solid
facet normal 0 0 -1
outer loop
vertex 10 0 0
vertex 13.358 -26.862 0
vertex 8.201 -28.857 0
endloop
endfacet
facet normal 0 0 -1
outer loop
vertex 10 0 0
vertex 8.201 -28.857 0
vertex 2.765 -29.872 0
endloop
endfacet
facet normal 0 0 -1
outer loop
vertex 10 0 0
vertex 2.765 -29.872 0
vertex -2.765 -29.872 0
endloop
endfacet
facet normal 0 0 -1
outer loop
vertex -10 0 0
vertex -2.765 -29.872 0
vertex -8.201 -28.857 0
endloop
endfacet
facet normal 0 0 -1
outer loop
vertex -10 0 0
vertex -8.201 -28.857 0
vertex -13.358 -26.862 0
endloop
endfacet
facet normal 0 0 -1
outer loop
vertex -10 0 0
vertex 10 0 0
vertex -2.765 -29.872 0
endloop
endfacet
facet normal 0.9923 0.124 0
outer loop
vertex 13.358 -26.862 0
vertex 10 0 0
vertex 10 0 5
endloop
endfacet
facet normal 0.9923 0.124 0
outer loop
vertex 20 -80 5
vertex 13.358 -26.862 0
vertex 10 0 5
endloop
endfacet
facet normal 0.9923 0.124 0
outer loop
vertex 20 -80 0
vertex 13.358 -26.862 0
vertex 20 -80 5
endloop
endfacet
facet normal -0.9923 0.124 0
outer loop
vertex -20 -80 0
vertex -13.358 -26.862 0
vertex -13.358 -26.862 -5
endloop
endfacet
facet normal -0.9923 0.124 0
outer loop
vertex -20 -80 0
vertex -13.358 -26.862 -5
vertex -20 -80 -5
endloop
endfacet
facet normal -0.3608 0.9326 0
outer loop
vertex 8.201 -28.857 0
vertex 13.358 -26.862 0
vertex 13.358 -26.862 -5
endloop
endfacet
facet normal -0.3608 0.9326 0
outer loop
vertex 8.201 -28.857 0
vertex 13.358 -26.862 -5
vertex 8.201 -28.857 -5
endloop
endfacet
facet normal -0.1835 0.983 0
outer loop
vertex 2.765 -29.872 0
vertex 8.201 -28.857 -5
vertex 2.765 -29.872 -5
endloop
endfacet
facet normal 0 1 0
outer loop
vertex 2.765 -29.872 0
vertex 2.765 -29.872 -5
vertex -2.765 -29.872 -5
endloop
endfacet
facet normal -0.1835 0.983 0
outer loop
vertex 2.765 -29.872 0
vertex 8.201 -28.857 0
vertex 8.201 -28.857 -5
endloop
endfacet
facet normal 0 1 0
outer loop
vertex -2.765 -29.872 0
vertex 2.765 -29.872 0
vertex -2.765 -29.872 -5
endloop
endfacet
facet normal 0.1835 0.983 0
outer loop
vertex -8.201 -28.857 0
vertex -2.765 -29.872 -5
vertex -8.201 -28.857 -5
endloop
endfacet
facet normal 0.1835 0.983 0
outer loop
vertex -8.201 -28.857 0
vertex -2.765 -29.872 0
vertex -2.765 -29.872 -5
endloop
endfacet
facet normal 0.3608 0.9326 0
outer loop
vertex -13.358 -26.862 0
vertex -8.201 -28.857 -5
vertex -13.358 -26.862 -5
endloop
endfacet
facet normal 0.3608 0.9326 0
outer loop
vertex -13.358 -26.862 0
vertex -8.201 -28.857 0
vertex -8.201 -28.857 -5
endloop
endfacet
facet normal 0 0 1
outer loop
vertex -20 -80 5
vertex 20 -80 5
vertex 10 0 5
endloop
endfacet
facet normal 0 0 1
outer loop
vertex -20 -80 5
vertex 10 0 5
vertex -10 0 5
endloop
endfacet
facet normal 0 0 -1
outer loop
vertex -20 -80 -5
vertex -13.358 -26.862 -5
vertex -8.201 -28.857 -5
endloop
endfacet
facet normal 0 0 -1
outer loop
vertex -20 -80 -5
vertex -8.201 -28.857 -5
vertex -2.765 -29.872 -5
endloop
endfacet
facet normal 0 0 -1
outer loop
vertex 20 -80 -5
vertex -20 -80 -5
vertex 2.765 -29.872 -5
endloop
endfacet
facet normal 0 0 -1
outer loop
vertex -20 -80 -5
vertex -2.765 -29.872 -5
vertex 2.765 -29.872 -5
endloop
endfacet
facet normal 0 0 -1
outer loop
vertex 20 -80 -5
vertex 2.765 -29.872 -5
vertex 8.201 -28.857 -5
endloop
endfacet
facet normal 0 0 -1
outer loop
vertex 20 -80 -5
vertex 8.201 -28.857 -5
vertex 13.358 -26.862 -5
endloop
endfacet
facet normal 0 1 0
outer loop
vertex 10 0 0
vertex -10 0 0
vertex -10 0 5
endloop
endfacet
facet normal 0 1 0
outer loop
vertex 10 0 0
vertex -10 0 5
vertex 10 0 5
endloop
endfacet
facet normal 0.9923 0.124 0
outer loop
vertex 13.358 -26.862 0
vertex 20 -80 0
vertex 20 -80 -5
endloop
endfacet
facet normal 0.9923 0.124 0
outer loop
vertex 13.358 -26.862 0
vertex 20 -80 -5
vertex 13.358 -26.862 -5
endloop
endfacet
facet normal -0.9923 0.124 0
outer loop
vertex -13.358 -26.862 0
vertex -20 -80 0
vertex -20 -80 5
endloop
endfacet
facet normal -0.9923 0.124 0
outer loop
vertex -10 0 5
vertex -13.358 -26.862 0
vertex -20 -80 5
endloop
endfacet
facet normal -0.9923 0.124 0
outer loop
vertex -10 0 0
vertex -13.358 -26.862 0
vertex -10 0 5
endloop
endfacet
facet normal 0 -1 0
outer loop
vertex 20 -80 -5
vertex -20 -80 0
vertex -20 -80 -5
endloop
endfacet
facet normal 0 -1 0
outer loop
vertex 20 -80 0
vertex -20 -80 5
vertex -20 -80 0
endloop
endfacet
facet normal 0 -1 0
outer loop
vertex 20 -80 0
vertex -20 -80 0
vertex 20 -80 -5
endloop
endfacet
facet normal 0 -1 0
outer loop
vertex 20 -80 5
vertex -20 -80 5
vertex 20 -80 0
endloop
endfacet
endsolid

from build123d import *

# Parameters (mm, degrees)
BOSS_EXTRUDE1_DEPTH = 5
BOSS_EXTRUDE2_DEPTH = 5


with BuildPart() as part:
    # Sketch1 → Boss-Extrude1 (new body)
    with BuildSketch(Plane.XY):
        Polygon((-10, 0), (10, 0), (20, -80), (-20, -80), align=None)
    extrude(amount=BOSS_EXTRUDE1_DEPTH)

    # Sketch2 → Boss-Extrude2 (add)
    with BuildSketch(Plane.XY):
        with BuildLine():
            Line((20, -80), (13.357757603, -26.862060826))
            ThreePointArc((13.357757603, -26.862060826), (0, -30), (-13.357757603, -26.862060826))
            Line((-13.357757603, -26.862060826), (-20, -80))
            Line((-20, -80), (20, -80))
        make_face()
    extrude(amount=-BOSS_EXTRUDE2_DEPTH)


solid = part.part
